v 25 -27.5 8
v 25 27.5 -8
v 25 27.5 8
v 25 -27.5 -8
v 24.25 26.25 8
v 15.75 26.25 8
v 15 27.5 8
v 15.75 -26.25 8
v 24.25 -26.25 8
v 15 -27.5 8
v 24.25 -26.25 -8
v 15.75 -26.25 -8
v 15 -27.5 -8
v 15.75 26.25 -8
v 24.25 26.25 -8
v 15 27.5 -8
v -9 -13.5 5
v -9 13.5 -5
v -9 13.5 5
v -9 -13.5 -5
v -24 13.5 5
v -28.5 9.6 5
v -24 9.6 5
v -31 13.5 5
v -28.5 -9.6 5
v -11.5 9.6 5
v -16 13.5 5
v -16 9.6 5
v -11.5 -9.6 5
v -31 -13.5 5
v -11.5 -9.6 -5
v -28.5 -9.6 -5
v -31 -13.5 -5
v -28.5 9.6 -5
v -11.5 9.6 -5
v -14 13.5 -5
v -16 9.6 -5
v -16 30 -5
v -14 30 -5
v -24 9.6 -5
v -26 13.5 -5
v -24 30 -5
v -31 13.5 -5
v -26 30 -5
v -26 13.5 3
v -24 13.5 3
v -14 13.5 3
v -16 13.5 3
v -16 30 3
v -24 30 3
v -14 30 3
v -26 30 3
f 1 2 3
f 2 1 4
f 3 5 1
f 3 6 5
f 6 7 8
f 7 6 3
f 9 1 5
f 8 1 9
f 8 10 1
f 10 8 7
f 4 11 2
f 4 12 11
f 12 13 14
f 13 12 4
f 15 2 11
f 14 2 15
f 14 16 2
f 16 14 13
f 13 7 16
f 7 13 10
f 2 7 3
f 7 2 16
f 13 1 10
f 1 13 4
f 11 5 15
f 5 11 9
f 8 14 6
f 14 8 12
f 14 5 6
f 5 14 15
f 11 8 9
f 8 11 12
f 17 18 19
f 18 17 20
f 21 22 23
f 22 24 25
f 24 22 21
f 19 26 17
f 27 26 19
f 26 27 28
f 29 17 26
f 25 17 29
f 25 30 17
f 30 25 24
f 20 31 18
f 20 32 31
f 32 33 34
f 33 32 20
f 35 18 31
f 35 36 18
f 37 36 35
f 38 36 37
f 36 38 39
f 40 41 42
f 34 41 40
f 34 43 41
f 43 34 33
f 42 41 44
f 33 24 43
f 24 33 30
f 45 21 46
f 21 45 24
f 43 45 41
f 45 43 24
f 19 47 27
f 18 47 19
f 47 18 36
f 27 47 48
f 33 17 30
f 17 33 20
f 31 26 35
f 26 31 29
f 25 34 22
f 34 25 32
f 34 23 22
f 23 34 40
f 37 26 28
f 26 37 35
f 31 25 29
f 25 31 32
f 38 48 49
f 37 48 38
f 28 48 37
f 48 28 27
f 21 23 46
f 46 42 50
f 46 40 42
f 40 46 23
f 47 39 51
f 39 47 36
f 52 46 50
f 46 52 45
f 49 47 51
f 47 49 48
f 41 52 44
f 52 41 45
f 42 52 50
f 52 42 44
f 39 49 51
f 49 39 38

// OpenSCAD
translate([20,0,0])
difference(){
    cube([10, 55, 16], center=true);
    cube([8.5, 52.5, 18], center=true);
}


translate([-20,0,0])
difference(){
    cube([22, 27, 10], center=true);
    cube([17, 19.2, 12], center=true);
    translate([0, 10, 0])
        cube([8, 20, 12], center=true);
}
translate([-20,20,-1])
difference(){
    cube([12, 20, 8], center=true);
    cube([8, 21, 12], center=true);
}
